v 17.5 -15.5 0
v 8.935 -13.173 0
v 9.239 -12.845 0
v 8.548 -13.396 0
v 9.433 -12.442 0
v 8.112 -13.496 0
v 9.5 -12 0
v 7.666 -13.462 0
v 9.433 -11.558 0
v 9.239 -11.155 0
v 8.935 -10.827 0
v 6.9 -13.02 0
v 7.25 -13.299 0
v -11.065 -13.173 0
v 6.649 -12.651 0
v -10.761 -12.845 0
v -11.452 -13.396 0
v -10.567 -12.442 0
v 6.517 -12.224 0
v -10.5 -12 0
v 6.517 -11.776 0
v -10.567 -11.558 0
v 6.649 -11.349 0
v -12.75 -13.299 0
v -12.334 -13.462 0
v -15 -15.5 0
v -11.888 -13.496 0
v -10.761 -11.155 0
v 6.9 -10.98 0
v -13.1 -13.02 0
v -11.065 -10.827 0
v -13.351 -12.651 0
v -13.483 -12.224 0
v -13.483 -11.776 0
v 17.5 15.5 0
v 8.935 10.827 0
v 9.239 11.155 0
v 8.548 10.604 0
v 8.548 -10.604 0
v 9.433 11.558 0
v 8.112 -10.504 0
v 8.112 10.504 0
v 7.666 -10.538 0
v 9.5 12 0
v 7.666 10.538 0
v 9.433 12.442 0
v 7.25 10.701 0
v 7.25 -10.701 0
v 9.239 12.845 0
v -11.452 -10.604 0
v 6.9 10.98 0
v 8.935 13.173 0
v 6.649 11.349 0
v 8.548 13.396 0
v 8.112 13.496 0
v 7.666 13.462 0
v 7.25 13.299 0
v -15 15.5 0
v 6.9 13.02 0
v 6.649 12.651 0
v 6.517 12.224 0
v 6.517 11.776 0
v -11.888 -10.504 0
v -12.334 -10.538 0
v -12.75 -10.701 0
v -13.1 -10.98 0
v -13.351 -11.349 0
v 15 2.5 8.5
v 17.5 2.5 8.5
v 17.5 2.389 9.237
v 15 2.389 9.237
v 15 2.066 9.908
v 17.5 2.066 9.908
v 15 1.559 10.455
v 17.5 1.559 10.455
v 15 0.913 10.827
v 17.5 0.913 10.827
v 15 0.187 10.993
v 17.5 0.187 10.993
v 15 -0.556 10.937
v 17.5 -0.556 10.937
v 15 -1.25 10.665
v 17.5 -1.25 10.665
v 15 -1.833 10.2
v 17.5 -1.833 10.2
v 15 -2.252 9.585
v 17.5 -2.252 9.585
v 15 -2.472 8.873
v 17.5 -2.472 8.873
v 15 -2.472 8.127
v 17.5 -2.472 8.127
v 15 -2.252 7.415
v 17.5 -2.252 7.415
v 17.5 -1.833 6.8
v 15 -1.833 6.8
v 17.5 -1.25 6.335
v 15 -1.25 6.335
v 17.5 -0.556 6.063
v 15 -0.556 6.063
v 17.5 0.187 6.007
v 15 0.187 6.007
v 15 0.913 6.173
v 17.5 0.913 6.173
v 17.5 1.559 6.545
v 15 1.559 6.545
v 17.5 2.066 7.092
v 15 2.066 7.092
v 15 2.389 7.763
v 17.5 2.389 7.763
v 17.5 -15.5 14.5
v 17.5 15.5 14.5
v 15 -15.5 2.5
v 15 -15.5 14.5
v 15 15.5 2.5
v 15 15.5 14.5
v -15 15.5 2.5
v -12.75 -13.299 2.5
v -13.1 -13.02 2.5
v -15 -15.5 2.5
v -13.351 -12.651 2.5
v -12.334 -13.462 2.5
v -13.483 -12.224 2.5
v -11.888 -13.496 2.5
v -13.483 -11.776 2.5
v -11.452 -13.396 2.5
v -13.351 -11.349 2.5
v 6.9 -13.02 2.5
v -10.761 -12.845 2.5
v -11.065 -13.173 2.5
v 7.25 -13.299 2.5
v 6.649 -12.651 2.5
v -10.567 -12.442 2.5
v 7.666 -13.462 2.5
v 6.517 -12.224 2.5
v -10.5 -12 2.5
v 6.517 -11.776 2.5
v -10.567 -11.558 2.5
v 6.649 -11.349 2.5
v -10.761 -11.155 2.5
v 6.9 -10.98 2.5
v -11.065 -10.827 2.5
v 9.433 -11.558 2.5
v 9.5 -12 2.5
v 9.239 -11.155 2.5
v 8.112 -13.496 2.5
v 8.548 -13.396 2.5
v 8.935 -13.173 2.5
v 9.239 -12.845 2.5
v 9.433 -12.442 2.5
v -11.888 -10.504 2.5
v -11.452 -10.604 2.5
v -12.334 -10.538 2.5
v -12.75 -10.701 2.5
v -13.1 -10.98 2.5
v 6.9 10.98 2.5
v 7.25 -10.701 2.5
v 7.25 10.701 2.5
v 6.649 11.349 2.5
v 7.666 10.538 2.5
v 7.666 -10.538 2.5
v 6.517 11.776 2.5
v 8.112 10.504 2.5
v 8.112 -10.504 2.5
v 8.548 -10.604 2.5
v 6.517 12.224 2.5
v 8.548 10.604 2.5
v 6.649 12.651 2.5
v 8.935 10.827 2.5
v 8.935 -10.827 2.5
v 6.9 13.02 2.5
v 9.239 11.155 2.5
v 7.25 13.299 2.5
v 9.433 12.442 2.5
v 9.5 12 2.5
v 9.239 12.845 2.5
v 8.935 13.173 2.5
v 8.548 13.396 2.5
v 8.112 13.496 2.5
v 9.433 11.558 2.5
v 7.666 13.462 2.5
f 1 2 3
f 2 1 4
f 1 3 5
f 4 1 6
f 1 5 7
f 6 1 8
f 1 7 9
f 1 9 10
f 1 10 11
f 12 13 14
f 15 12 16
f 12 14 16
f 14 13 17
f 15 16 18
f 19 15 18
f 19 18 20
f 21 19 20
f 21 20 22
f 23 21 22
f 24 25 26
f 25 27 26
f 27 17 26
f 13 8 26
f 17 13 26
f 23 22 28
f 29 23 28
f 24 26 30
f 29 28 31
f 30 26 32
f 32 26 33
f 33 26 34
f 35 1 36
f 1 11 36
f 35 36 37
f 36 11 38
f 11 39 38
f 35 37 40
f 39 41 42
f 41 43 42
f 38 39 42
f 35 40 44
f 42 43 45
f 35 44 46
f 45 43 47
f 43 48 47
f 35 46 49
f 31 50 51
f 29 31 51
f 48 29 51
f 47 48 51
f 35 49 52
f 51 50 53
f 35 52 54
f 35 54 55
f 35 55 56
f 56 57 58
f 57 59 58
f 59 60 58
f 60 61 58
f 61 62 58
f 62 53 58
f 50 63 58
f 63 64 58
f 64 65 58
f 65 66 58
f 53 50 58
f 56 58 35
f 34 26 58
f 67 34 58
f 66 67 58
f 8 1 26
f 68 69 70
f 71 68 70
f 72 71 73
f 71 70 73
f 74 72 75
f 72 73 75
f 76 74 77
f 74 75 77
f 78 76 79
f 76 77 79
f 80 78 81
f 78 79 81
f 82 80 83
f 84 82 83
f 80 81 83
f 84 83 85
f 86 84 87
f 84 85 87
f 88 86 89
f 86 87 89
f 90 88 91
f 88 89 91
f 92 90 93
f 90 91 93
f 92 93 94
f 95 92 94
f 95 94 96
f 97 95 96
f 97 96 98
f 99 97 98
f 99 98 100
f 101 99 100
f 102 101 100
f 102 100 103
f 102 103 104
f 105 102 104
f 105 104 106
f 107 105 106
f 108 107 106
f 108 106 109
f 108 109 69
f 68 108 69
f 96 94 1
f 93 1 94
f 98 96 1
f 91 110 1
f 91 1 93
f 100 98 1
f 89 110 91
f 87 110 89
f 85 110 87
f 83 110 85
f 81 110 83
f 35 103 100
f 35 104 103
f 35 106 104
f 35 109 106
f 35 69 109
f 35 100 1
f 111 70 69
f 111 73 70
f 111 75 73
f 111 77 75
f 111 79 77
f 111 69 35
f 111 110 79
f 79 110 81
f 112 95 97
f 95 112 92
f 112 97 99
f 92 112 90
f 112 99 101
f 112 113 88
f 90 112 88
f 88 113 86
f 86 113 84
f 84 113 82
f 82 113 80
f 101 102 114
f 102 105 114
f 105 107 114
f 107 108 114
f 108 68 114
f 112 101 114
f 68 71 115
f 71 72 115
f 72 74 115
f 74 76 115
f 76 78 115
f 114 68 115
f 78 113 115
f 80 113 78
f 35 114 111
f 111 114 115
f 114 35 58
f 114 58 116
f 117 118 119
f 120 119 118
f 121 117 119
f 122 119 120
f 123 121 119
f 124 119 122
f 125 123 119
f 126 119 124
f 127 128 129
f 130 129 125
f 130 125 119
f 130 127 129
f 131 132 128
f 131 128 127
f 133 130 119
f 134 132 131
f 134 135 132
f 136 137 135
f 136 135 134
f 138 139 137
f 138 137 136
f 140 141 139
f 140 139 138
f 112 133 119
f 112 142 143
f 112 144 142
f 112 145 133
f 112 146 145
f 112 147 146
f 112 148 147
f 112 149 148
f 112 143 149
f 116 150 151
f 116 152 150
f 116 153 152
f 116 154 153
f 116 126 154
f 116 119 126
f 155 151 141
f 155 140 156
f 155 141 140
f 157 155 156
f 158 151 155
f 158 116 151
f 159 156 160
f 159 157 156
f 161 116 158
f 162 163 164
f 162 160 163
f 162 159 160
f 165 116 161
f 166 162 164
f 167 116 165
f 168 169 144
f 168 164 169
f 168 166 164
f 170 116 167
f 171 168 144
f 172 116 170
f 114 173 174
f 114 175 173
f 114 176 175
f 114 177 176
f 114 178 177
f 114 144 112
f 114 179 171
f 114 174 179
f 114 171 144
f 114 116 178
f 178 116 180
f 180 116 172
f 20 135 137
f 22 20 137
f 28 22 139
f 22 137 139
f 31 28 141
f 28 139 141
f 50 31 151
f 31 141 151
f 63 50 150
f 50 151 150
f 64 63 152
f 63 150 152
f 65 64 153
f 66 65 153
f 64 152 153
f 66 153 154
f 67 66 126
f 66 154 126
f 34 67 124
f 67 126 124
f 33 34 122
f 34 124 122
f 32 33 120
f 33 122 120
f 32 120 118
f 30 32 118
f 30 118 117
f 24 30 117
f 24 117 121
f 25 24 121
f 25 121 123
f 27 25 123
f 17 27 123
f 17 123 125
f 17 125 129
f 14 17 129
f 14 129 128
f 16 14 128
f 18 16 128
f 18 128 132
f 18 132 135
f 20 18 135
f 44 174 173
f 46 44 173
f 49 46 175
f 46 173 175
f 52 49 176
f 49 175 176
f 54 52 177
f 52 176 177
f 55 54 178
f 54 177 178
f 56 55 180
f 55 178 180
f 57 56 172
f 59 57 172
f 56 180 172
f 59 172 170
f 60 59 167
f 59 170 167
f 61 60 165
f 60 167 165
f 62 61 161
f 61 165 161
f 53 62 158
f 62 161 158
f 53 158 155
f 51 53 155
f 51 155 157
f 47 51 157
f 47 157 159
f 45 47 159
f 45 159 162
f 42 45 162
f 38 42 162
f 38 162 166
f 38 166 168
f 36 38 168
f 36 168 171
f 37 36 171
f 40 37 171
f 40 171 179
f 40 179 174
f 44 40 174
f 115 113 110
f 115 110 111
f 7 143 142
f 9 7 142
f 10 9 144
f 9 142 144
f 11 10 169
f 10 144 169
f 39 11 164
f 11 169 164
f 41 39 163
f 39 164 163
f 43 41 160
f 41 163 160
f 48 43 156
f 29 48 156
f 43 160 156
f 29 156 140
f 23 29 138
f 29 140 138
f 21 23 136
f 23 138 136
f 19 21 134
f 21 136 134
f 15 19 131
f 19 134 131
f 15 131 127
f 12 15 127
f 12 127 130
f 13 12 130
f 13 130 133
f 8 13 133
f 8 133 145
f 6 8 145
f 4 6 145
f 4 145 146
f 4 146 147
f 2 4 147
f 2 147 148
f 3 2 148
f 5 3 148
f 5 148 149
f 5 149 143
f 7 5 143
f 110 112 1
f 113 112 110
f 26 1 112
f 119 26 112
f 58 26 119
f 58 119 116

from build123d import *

# Parameters (mm, degrees)
F0_W     = 30
F0_H     = 31
F1_DEPTH = 2.5
F2_R     = 1.5
F3_DEPTH = 2.501
F4_W     = 31
F4_H     = 14.5
F5_DEPTH = 2.5
F6_R     = 2.5
F7_DEPTH = 32.501


with BuildPart() as f1:
    # F0 (on Top) → F1 (new body)
    with BuildSketch(Plane.XY):
        Rectangle(F0_W, F0_H)
    extrude(amount=F1_DEPTH)

    # F2 (on face) → F3 (cut, through all)
    with BuildSketch(Plane.XY.offset(2.5)):
        with Locations((-12, -12)):
            Circle(F2_R)
        with Locations((8, -12)):
            Circle(F2_R)
        with Locations((8, 12)):
            Circle(F2_R)
    extrude(amount=-F3_DEPTH, mode=Mode.SUBTRACT)

    # F4 (on face) → F5 (join)
    with BuildSketch(Plane.YZ.offset(15)):
        with Locations((0, 7.25)):
            Rectangle(F4_W, F4_H)
    extrude(amount=F5_DEPTH)

    # F6 (on face) → F7 (cut, through all)
    with BuildSketch(Plane.YZ.offset(17.5)):
        with Locations((0, 8.5)):
            Circle(F6_R)
    extrude(amount=-F7_DEPTH, mode=Mode.SUBTRACT)


solid = f1.part
